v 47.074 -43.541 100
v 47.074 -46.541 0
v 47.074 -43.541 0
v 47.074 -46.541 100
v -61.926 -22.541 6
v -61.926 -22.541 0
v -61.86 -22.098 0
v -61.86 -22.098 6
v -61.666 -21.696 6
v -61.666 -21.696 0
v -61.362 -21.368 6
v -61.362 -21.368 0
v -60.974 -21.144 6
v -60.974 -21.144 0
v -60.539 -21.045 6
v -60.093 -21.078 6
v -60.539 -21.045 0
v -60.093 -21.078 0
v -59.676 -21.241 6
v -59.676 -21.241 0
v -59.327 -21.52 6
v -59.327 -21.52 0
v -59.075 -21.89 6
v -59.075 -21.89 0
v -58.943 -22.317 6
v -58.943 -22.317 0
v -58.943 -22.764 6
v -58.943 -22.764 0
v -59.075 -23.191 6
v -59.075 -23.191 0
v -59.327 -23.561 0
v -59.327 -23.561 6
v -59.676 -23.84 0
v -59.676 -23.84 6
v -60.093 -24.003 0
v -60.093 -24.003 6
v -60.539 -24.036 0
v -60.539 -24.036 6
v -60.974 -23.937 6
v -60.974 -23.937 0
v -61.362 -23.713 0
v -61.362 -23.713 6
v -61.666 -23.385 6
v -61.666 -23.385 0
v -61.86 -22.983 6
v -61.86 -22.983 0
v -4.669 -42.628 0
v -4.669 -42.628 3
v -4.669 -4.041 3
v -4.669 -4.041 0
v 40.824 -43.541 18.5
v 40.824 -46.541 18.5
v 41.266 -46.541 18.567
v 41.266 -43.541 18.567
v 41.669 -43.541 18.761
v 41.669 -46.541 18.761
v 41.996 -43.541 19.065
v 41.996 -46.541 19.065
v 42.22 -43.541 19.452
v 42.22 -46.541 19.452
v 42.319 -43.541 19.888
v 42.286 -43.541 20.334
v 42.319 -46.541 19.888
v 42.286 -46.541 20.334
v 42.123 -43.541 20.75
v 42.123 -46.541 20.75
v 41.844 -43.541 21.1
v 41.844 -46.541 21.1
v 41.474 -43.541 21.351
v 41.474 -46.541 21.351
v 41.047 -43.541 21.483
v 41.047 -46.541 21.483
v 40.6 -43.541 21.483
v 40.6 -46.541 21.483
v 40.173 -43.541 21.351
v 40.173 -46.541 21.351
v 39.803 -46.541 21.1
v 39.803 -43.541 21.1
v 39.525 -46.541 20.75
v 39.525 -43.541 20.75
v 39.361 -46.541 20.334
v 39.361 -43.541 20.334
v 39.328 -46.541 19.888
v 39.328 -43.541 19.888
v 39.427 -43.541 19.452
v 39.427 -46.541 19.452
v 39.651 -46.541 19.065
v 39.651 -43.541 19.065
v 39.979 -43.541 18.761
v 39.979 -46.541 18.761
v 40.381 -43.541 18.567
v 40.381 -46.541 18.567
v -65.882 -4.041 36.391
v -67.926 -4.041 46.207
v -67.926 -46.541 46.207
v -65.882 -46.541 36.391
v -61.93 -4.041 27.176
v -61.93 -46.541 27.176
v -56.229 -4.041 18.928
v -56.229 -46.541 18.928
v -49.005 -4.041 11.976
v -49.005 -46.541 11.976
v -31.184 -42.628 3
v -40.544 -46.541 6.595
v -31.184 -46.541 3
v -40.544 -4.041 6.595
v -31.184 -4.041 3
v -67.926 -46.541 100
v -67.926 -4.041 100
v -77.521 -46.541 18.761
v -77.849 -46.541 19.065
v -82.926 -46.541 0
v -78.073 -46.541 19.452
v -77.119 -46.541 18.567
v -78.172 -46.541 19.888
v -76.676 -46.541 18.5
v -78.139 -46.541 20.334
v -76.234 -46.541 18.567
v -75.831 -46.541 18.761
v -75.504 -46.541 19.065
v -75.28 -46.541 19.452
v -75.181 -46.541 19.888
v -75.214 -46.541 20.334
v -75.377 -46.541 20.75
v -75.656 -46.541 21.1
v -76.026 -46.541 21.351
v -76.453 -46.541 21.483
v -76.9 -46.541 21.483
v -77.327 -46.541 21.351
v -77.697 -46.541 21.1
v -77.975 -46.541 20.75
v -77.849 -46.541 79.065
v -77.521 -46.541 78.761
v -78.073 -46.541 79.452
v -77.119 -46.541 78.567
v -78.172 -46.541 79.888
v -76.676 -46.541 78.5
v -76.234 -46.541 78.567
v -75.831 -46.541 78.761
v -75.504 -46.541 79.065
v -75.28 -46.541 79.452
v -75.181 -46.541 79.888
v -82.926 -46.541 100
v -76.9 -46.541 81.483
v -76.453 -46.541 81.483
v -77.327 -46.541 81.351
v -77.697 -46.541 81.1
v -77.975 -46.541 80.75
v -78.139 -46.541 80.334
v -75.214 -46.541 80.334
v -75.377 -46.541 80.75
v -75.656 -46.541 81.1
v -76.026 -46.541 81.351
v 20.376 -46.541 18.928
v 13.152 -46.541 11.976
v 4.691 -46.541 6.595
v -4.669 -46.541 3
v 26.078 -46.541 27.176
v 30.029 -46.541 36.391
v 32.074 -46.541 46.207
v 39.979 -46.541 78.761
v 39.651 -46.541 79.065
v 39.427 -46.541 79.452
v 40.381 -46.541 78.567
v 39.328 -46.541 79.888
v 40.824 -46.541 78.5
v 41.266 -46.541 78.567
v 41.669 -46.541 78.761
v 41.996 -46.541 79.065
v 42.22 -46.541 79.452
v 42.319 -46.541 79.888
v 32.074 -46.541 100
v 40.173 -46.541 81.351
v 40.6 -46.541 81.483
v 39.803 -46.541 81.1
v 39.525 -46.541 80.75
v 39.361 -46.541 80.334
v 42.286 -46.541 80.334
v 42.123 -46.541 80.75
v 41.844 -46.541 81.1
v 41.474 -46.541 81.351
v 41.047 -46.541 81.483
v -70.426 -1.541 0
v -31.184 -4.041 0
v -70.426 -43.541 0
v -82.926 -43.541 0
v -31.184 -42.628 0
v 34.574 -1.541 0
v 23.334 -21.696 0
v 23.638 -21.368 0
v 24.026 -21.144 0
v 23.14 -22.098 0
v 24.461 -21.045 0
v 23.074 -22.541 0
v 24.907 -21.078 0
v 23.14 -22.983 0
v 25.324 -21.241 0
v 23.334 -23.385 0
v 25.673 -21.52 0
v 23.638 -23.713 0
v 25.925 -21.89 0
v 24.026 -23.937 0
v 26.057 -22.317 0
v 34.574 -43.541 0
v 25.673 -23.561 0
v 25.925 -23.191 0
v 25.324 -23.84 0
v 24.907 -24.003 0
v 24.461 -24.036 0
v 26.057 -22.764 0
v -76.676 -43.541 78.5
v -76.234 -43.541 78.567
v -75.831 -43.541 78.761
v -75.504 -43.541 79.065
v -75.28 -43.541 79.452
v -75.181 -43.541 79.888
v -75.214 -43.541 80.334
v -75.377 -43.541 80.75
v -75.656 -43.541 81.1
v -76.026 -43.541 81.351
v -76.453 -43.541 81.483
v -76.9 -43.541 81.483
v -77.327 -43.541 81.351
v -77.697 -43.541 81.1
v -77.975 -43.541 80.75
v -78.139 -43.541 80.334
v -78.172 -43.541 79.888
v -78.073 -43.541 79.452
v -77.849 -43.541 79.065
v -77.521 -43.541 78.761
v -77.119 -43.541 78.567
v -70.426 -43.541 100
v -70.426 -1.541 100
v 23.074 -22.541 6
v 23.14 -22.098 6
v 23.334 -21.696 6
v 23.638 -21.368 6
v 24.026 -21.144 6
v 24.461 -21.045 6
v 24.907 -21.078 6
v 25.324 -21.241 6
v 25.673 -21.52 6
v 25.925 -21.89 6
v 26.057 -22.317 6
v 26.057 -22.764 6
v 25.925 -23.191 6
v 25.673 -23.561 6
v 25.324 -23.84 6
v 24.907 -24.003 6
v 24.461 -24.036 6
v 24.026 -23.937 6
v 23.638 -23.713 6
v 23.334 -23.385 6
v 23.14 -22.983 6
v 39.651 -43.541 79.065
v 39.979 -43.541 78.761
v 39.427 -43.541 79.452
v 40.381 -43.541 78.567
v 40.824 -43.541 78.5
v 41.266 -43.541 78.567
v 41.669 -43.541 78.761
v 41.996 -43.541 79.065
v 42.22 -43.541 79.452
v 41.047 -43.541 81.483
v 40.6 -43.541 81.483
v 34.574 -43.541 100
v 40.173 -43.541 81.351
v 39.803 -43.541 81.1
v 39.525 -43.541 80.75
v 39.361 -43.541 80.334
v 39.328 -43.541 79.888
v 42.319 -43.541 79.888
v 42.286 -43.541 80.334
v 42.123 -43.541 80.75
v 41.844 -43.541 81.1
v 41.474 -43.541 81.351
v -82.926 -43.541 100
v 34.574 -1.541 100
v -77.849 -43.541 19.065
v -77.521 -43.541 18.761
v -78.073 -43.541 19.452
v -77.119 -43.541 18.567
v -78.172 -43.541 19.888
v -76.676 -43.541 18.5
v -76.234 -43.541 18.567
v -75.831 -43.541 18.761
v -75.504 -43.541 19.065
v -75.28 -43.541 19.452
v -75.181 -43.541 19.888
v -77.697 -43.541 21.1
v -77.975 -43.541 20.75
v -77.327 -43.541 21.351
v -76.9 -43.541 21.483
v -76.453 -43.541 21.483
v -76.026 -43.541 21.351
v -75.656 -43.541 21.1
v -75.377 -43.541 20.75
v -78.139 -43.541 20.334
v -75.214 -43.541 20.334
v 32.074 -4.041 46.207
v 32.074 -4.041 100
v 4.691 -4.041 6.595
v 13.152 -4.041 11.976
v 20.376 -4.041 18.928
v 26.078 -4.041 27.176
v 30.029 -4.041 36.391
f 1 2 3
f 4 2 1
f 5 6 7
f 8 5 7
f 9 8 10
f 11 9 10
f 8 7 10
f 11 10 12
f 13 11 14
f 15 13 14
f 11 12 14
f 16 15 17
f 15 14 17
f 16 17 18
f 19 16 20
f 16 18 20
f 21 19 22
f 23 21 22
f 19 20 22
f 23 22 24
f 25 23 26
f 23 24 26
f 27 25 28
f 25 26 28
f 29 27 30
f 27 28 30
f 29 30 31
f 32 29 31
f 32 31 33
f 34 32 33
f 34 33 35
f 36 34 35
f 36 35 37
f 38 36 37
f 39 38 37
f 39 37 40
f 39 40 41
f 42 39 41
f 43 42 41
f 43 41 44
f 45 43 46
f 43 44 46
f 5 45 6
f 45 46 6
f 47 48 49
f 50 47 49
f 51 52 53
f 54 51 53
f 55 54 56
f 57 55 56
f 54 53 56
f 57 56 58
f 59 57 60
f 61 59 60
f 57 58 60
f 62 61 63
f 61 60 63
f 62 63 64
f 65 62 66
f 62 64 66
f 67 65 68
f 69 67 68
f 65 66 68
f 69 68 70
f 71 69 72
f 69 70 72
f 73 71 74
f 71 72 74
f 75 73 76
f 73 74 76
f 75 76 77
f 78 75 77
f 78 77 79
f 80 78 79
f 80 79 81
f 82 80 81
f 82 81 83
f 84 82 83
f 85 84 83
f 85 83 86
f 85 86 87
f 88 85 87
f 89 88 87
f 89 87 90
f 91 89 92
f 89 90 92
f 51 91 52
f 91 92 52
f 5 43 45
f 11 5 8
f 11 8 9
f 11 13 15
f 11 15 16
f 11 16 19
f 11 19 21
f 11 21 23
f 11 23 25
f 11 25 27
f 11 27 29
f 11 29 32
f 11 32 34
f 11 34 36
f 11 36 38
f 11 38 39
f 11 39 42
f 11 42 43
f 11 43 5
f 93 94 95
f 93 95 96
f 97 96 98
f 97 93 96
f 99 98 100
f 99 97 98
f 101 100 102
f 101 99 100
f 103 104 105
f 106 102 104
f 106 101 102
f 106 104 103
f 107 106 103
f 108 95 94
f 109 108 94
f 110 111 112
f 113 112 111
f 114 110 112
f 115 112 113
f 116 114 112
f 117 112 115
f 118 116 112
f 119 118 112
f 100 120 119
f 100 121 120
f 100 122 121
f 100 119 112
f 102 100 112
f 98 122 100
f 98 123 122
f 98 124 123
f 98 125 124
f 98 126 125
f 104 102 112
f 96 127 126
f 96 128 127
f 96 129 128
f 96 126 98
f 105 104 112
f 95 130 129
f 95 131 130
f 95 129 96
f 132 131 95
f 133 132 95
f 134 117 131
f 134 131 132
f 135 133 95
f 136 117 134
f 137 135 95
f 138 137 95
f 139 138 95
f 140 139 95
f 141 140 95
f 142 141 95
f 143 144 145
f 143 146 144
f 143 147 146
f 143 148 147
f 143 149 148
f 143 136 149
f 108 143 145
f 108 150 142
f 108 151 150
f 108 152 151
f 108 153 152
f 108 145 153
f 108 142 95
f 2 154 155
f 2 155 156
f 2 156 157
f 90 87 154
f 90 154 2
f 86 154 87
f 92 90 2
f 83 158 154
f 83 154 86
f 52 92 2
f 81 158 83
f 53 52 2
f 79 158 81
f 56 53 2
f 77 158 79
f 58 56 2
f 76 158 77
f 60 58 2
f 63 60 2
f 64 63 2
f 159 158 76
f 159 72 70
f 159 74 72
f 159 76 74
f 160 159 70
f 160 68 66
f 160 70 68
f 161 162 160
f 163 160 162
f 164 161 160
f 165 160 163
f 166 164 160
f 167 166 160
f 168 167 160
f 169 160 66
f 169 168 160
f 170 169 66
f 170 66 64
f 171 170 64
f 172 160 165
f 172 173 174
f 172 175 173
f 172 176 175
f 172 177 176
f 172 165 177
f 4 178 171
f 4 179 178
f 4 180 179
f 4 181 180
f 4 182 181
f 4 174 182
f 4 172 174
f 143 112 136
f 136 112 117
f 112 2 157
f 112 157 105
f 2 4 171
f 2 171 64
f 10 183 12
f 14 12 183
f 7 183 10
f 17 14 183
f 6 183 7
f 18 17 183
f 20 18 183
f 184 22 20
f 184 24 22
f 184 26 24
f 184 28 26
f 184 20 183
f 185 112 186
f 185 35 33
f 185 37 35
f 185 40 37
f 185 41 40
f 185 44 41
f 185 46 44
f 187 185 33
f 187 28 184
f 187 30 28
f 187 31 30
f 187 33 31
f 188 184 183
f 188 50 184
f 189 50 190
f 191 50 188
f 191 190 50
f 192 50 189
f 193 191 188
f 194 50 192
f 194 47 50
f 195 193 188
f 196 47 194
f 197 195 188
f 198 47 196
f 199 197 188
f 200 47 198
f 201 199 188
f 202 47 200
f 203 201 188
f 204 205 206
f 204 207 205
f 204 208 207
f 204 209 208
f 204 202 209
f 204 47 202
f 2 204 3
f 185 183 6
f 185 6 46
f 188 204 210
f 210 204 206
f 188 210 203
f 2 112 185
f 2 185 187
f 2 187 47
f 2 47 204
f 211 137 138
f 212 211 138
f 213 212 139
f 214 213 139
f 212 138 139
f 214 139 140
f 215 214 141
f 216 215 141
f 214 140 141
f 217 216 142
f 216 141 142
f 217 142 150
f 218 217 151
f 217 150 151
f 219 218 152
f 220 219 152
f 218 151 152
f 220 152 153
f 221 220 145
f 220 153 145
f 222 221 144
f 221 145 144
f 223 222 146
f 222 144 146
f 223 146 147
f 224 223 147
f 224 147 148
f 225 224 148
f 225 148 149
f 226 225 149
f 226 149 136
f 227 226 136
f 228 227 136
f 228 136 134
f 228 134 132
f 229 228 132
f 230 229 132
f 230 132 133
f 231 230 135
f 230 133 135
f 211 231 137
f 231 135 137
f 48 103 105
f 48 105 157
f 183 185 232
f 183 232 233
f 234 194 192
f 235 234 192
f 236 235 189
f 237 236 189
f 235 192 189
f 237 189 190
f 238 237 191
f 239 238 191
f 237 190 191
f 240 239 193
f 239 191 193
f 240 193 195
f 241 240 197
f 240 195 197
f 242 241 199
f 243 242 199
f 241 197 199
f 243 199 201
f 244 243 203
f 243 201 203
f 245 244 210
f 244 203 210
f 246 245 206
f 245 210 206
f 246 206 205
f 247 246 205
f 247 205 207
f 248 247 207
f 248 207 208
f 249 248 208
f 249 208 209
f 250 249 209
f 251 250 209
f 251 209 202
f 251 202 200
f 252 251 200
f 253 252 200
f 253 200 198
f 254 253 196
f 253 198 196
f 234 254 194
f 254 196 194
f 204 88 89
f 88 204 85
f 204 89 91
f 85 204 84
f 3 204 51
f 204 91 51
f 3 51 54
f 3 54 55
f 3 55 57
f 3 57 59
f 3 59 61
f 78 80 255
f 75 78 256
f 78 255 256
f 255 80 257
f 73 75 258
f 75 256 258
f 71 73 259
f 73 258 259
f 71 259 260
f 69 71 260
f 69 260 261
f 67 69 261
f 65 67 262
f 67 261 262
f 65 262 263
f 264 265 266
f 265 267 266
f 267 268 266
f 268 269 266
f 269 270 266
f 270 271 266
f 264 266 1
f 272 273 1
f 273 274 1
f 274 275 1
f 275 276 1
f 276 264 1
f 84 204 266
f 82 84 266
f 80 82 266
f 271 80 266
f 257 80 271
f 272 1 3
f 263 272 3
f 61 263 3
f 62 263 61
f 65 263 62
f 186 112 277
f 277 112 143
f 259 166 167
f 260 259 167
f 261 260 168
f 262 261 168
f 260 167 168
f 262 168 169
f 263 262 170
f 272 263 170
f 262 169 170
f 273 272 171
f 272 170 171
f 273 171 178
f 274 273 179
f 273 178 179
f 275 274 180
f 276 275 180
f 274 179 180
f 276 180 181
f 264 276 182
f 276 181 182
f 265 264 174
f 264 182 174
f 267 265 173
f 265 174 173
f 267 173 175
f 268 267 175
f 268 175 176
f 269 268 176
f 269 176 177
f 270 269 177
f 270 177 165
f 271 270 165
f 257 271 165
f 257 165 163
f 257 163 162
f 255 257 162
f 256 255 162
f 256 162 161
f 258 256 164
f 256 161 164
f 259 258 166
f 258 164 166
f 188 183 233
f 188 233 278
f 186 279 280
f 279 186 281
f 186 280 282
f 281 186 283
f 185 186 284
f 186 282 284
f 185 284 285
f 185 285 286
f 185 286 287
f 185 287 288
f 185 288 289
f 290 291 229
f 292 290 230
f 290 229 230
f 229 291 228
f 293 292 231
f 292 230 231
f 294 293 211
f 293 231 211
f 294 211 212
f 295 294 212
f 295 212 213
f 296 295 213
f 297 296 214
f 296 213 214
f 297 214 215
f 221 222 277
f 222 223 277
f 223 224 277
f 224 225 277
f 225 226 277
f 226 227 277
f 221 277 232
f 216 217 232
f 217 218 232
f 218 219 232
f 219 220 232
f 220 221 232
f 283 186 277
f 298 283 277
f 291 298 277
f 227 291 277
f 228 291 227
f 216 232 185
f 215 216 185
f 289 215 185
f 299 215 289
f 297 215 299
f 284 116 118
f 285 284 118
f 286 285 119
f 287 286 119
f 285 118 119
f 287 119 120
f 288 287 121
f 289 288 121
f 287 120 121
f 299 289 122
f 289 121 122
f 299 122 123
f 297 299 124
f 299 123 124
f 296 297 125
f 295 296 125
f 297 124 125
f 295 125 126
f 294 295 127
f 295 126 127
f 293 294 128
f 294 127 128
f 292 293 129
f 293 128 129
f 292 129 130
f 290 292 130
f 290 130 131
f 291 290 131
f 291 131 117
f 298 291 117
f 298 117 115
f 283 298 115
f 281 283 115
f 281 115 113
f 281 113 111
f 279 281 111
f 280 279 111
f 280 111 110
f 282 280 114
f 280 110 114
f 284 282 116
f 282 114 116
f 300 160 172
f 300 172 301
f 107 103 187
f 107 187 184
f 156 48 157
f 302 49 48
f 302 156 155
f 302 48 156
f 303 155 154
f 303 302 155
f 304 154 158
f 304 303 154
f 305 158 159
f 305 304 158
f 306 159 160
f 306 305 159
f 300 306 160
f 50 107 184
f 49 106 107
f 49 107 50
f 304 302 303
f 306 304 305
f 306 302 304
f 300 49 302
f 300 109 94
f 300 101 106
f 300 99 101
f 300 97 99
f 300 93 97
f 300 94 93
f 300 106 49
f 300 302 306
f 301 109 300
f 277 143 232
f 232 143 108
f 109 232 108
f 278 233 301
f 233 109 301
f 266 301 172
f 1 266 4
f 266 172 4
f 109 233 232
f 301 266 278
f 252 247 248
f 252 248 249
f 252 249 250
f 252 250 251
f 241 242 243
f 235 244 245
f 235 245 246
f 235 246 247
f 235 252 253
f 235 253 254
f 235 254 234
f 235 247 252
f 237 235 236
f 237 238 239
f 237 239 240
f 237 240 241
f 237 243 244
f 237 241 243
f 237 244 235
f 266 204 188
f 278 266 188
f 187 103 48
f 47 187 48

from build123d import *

# Parameters (mm, degrees)
SKETCH1_W           = 105
SKETCH1_H           = 75
SKETCH1_W_2         = 100
SKETCH1_H_2         = 70
BOSS_EXTRUDE1_DEPTH = 100
SKETCH1_2_W         = 105
SKETCH1_2_H         = 75
BOSS_EXTRUDE2_DEPTH = 3
BOSS_EXTRUDE3_DEPTH = 73
CUT_EXTRUDE3_START  = -21.5
CUT_EXTRUDE3_DEPTH  = 21.5
CUT_EXTRUDE4_START  = -30
CUT_EXTRUDE4_DEPTH  = 30
SKETCH7_W           = 26.515577751
SKETCH7_H           = 38.587429438
CUT_EXTRUDE5_DEPTH  = 71
SKETCH8_W           = 12.5
SKETCH8_H           = 100
SKETCH8_R           = 1.5
BOSS_EXTRUDE4_DEPTH = 3
SKETCH9_R           = 1.5
CUT_EXTRUDE6_DEPTH  = 6


with BuildPart() as part:
    # Sketch1 → Boss-Extrude1 (new body)
    with BuildSketch(Plane.XY):
        with Locations((-17.926459532, -39.040517308)):
            Rectangle(SKETCH1_W, SKETCH1_H)
        with Locations((-17.926459532, -39.040517308)):
            Rectangle(SKETCH1_W_2, SKETCH1_H_2, mode=Mode.SUBTRACT)
    extrude(amount=BOSS_EXTRUDE1_DEPTH)

    # Sketch1<2> → Boss-Extrude2 (add)
    with BuildSketch(Plane.XY):
        with Locations((-17.926459532, -39.040517308)):
            Rectangle(SKETCH1_2_W, SKETCH1_2_H)
    extrude(amount=BOSS_EXTRUDE2_DEPTH)

    # Sketch4 → Boss-Extrude3 (add)
    with BuildSketch(Plane(origin=(0, -1.540517308, 0), x_dir=(1, 0, 0), z_dir=(0, 1, 0))):
        with BuildLine():
            Line((32.352949433, -3), (-4.668670656, -3))
            ThreePointArc((-4.668670656, -3), (22.039856002, -20.992417524), (32.352949433, -51.5))
            Line((32.352949433, -51.5), (32.352949433, -3))
        make_face()
        with BuildLine():
            Line((-67.926459532, -3), (-67.926459532, -46.206705574))
            ThreePointArc((-67.926459532, -46.206705574), (-56.229094102, -18.928123314), (-31.184248407, -3))
            Line((-31.184248407, -3), (-67.926459532, -3))
        make_face()
    extrude(amount=-BOSS_EXTRUDE3_DEPTH)

    # Sketch5 → Cut-Extrude3 (cut)
    with BuildSketch(Plane.XZ.offset(76.540517308).offset(CUT_EXTRUDE3_START)):
        with BuildLine():
            Line((31.63486206, 100), (-67.926459532, 100))
            Line((-67.926459532, 100), (-67.926459532, 46.206705574))
            ThreePointArc((-67.926459532, 46.206705574), (-56.361491054, 19.084458701), (-31.579033768, 3.109647836))
            Line((-31.579033768, 3.109647836), (-4.273885295, 3.109647836))
            ThreePointArc((-4.273885295, 3.109647836), (19.456191853, 17.876253312), (31.63486206, 43.032747318))
            Line((31.63486206, 43.032747318), (31.63486206, 100))
        make_face()
    extrude(amount=CUT_EXTRUDE3_DEPTH, mode=Mode.SUBTRACT)

    # Sketch6 → Cut-Extrude4 (cut)
    with BuildSketch(Plane.XZ.offset(76.540517308).offset(CUT_EXTRUDE4_START)):
        with BuildLine():
            Line((-67.926459532, 46.206705574), (-67.926459532, 100))
            Line((-67.926459532, 100), (-70.426459532, 100))
            Line((-70.426459532, 100), (-70.426459532, 0))
            Line((-70.426459532, 0), (34.573540468, 0))
            Line((34.573540468, 0), (34.573540468, 100))
            Line((34.573540468, 100), (31.63486206, 100))
            Line((31.63486206, 100), (31.63486206, 43.032747318))
            ThreePointArc((31.63486206, 43.032747318), (19.456191853, 17.876253312), (-4.273885295, 3.109647836))
            Line((-4.273885295, 3.109647836), (-31.579033768, 3.109647836))
            ThreePointArc((-31.579033768, 3.109647836), (-56.361491054, 19.084458701), (-67.926459532, 46.206705574))
        make_face()
    extrude(amount=CUT_EXTRUDE4_DEPTH, mode=Mode.SUBTRACT)

    # Sketch7 → Cut-Extrude5 (cut)
    with BuildSketch(Plane.XY.offset(3)):
        with Locations((-17.926459532, -23.334232027)):
            Rectangle(SKETCH7_W, SKETCH7_H)
    extrude(amount=-CUT_EXTRUDE5_DEPTH, mode=Mode.SUBTRACT)

    # Sketch8 → Boss-Extrude4 (add)
    # profile 1 of 2: a face of its own
    with BuildSketch(Plane.XZ.offset(46.540517308)):
        with Locations((-76.676459532, 50)):
            Rectangle(SKETCH8_W, SKETCH8_H)
        with Locations((-76.676459532, 20)):
            Circle(SKETCH8_R, mode=Mode.SUBTRACT)
        with Locations((-76.676459532, 80)):
            Circle(SKETCH8_R, mode=Mode.SUBTRACT)
    # profile 2 of 2: a face of its own
    with BuildSketch(Plane.XZ.offset(46.540517308)):
        with Locations((40.823540468, 50)):
            Rectangle(SKETCH8_W, SKETCH8_H)
        with Locations((40.823540468, 20)):
            Circle(SKETCH8_R, mode=Mode.SUBTRACT)
        with Locations((40.823540468, 80)):
            Circle(SKETCH8_R, mode=Mode.SUBTRACT)
    extrude(amount=-BOSS_EXTRUDE4_DEPTH)

    # Sketch9 → Cut-Extrude6 (cut)
    with BuildSketch(Plane(origin=(0, 0, 0), x_dir=(-1, 0, 0), z_dir=(0, 0, -1))):
        with Locations((-24.573540468, -22.540517308)):
            Circle(SKETCH9_R)
        with Locations((60.426459532, -22.540517308)):
            Circle(SKETCH9_R)
    extrude(amount=-CUT_EXTRUDE6_DEPTH, mode=Mode.SUBTRACT)


solid = part.part
